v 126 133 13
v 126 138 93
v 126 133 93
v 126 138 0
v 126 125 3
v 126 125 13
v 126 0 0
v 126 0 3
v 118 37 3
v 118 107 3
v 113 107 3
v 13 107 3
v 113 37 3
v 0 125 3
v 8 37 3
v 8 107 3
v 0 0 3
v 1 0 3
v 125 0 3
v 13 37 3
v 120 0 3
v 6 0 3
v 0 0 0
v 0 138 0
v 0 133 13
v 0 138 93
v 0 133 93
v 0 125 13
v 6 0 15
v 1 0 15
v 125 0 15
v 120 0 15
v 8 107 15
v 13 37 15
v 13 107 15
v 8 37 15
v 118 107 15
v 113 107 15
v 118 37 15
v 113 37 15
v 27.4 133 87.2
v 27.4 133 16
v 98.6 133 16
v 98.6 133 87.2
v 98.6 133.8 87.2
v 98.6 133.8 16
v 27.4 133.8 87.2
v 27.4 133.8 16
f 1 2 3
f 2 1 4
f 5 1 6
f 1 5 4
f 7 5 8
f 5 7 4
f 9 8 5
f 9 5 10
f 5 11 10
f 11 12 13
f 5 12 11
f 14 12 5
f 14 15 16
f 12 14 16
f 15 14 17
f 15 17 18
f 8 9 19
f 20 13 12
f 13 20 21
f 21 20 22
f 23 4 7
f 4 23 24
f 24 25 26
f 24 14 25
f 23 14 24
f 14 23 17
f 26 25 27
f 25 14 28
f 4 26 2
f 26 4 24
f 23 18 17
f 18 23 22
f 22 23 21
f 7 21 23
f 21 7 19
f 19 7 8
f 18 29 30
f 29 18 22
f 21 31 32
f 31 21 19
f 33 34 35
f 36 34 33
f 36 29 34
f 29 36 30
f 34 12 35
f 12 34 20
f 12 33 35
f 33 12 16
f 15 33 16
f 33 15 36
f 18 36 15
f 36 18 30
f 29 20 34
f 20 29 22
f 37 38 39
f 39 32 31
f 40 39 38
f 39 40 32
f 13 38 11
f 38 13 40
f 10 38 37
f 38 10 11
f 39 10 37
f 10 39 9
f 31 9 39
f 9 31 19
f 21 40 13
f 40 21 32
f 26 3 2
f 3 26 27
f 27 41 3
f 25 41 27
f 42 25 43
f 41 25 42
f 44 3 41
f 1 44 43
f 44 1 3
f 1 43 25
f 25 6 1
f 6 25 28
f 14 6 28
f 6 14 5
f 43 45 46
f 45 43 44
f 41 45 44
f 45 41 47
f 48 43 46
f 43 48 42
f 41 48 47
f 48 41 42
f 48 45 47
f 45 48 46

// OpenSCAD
// Passive one-robot docking alignment fit, never an energized charging cradle.
// CC0 original part. Nominal dimensions are an example, not measured robot fit.
$fn = 32;
part = "dock_passive_fit";
track_outer_width_mm = 96; // replace with measured real track outer width
side_clearance_each_mm = 2; // change after real printed clearance trial
base_length_mm = 138;
base_thickness_mm = 3;
guide_wall_mm = 5;
guide_run_mm = 107;
entry_flare_each_mm = 7;
guide_height_mm = 12;
backstop_thickness_mm = 5;
backstop_height_mm = 90;
wall_outside_margin_mm = 8;
// The printable AprilTag must have a WHITE quiet border around the measured
// black marker. Registration pocket is on the side facing the approaching pet.
tag_black_side_mm = 60;
tag_white_margin_each_mm = 5;
tag_paper_slack_each_mm = 0.6;
tag_recess_depth_mm = 0.8;
tag_bottom_z_mm = 16;
tag_paper_side_mm = tag_black_side_mm + 2 * tag_white_margin_each_mm;
tag_pocket_side_mm = tag_paper_side_mm + 2 * tag_paper_slack_each_mm;
channel_mm = track_outer_width_mm + 2 * side_clearance_each_mm;
inner_wall_x = guide_wall_mm + wall_outside_margin_mm;
outside_width_mm = channel_mm + 2 * inner_wall_x;
backstop_front_y_mm = base_length_mm - backstop_thickness_mm;
// The reversible coupon includes the 37 mm flare and straight guide.
entry_coupon_length_mm = 48;
assert(track_outer_width_mm > 40 && track_outer_width_mm < 200);
assert(side_clearance_each_mm >= 0.5 && side_clearance_each_mm < 8);
assert(base_length_mm > guide_run_mm + backstop_thickness_mm);
assert(entry_flare_each_mm > 0 && entry_flare_each_mm < inner_wall_x);
assert(entry_coupon_length_mm > 37 && entry_coupon_length_mm < guide_run_mm);
// Geometry invariants shared by the full dock and its entry coupon.
// The nominal channel must be measured between the INNER faces of the rails.
assert(abs((outside_width_mm - 2 * inner_wall_x) - channel_mm) < 0.001);
assert(inner_wall_x - guide_wall_mm - entry_flare_each_mm >= 0);
assert(guide_wall_mm > 0 && guide_run_mm > 37);
assert(tag_black_side_mm >= 10 && tag_black_side_mm <= 75);
assert(tag_white_margin_each_mm >= 4 && tag_white_margin_each_mm <= 10);
assert(tag_paper_slack_each_mm >= 0.25 && tag_paper_slack_each_mm <= 1.5);
assert(tag_recess_depth_mm >= 0.4 && tag_recess_depth_mm < backstop_thickness_mm - 2);
assert(tag_pocket_side_mm < outside_width_mm - 2 * inner_wall_x);
assert(tag_bottom_z_mm >= base_thickness_mm + 10 + 2);
assert(tag_bottom_z_mm + tag_pocket_side_mm + 3 <= base_thickness_mm + backstop_height_mm);

module one_side_rail() {
    // Wider entry mouth is tapered into a measured track width.
    linear_extrude(height = guide_height_mm)
        polygon(points=[
            // The inner face sets the measured channel width. Both rail
            // faces flare outward at entry while keeping wall thickness.
            [inner_wall_x - guide_wall_mm - entry_flare_each_mm, 0],
            [inner_wall_x - entry_flare_each_mm, 0],
            [inner_wall_x, 37],
            [inner_wall_x, guide_run_mm],
            [inner_wall_x - guide_wall_mm, guide_run_mm],
            [inner_wall_x - guide_wall_mm, 37]
        ]);
}

module dock_rail_section() {
    union() {
        cube([outside_width_mm, base_length_mm, base_thickness_mm]);
        translate([0,0,base_thickness_mm]) one_side_rail();
        translate([outside_width_mm,0,base_thickness_mm])
            mirror([1,0,0]) one_side_rail();
    }
}

module dock_passive_fit() {
    // Recessed AprilTag paper with >2 mm of unpowered backing.
    difference() {
        union() {
            dock_rail_section();
            translate([0,backstop_front_y_mm,base_thickness_mm])
                cube([outside_width_mm,backstop_thickness_mm,backstop_height_mm]);
            translate([0,backstop_front_y_mm - 8,base_thickness_mm])
                cube([outside_width_mm,8,10]);
        }
        translate([(outside_width_mm - tag_pocket_side_mm) / 2,
                   backstop_front_y_mm - 0.01, tag_bottom_z_mm])
            cube([tag_pocket_side_mm, tag_recess_depth_mm + 0.01,
                  tag_pocket_side_mm]);
    }
}

module dock_rail_entry_coupon() {
    // Unpowered entry guide only; no AprilTag, stop or charging contacts.
    // Reuses the exact full-dock guide geometry.
    intersection() {
        dock_rail_section();
        cube([outside_width_mm, entry_coupon_length_mm,
              base_thickness_mm + guide_height_mm]);
    }
}

if (part == "dock_passive_fit") dock_passive_fit();
else if (part == "dock_rail_entry_coupon") dock_rail_entry_coupon();
else assert(false, "Unknown passive dock fit part");
